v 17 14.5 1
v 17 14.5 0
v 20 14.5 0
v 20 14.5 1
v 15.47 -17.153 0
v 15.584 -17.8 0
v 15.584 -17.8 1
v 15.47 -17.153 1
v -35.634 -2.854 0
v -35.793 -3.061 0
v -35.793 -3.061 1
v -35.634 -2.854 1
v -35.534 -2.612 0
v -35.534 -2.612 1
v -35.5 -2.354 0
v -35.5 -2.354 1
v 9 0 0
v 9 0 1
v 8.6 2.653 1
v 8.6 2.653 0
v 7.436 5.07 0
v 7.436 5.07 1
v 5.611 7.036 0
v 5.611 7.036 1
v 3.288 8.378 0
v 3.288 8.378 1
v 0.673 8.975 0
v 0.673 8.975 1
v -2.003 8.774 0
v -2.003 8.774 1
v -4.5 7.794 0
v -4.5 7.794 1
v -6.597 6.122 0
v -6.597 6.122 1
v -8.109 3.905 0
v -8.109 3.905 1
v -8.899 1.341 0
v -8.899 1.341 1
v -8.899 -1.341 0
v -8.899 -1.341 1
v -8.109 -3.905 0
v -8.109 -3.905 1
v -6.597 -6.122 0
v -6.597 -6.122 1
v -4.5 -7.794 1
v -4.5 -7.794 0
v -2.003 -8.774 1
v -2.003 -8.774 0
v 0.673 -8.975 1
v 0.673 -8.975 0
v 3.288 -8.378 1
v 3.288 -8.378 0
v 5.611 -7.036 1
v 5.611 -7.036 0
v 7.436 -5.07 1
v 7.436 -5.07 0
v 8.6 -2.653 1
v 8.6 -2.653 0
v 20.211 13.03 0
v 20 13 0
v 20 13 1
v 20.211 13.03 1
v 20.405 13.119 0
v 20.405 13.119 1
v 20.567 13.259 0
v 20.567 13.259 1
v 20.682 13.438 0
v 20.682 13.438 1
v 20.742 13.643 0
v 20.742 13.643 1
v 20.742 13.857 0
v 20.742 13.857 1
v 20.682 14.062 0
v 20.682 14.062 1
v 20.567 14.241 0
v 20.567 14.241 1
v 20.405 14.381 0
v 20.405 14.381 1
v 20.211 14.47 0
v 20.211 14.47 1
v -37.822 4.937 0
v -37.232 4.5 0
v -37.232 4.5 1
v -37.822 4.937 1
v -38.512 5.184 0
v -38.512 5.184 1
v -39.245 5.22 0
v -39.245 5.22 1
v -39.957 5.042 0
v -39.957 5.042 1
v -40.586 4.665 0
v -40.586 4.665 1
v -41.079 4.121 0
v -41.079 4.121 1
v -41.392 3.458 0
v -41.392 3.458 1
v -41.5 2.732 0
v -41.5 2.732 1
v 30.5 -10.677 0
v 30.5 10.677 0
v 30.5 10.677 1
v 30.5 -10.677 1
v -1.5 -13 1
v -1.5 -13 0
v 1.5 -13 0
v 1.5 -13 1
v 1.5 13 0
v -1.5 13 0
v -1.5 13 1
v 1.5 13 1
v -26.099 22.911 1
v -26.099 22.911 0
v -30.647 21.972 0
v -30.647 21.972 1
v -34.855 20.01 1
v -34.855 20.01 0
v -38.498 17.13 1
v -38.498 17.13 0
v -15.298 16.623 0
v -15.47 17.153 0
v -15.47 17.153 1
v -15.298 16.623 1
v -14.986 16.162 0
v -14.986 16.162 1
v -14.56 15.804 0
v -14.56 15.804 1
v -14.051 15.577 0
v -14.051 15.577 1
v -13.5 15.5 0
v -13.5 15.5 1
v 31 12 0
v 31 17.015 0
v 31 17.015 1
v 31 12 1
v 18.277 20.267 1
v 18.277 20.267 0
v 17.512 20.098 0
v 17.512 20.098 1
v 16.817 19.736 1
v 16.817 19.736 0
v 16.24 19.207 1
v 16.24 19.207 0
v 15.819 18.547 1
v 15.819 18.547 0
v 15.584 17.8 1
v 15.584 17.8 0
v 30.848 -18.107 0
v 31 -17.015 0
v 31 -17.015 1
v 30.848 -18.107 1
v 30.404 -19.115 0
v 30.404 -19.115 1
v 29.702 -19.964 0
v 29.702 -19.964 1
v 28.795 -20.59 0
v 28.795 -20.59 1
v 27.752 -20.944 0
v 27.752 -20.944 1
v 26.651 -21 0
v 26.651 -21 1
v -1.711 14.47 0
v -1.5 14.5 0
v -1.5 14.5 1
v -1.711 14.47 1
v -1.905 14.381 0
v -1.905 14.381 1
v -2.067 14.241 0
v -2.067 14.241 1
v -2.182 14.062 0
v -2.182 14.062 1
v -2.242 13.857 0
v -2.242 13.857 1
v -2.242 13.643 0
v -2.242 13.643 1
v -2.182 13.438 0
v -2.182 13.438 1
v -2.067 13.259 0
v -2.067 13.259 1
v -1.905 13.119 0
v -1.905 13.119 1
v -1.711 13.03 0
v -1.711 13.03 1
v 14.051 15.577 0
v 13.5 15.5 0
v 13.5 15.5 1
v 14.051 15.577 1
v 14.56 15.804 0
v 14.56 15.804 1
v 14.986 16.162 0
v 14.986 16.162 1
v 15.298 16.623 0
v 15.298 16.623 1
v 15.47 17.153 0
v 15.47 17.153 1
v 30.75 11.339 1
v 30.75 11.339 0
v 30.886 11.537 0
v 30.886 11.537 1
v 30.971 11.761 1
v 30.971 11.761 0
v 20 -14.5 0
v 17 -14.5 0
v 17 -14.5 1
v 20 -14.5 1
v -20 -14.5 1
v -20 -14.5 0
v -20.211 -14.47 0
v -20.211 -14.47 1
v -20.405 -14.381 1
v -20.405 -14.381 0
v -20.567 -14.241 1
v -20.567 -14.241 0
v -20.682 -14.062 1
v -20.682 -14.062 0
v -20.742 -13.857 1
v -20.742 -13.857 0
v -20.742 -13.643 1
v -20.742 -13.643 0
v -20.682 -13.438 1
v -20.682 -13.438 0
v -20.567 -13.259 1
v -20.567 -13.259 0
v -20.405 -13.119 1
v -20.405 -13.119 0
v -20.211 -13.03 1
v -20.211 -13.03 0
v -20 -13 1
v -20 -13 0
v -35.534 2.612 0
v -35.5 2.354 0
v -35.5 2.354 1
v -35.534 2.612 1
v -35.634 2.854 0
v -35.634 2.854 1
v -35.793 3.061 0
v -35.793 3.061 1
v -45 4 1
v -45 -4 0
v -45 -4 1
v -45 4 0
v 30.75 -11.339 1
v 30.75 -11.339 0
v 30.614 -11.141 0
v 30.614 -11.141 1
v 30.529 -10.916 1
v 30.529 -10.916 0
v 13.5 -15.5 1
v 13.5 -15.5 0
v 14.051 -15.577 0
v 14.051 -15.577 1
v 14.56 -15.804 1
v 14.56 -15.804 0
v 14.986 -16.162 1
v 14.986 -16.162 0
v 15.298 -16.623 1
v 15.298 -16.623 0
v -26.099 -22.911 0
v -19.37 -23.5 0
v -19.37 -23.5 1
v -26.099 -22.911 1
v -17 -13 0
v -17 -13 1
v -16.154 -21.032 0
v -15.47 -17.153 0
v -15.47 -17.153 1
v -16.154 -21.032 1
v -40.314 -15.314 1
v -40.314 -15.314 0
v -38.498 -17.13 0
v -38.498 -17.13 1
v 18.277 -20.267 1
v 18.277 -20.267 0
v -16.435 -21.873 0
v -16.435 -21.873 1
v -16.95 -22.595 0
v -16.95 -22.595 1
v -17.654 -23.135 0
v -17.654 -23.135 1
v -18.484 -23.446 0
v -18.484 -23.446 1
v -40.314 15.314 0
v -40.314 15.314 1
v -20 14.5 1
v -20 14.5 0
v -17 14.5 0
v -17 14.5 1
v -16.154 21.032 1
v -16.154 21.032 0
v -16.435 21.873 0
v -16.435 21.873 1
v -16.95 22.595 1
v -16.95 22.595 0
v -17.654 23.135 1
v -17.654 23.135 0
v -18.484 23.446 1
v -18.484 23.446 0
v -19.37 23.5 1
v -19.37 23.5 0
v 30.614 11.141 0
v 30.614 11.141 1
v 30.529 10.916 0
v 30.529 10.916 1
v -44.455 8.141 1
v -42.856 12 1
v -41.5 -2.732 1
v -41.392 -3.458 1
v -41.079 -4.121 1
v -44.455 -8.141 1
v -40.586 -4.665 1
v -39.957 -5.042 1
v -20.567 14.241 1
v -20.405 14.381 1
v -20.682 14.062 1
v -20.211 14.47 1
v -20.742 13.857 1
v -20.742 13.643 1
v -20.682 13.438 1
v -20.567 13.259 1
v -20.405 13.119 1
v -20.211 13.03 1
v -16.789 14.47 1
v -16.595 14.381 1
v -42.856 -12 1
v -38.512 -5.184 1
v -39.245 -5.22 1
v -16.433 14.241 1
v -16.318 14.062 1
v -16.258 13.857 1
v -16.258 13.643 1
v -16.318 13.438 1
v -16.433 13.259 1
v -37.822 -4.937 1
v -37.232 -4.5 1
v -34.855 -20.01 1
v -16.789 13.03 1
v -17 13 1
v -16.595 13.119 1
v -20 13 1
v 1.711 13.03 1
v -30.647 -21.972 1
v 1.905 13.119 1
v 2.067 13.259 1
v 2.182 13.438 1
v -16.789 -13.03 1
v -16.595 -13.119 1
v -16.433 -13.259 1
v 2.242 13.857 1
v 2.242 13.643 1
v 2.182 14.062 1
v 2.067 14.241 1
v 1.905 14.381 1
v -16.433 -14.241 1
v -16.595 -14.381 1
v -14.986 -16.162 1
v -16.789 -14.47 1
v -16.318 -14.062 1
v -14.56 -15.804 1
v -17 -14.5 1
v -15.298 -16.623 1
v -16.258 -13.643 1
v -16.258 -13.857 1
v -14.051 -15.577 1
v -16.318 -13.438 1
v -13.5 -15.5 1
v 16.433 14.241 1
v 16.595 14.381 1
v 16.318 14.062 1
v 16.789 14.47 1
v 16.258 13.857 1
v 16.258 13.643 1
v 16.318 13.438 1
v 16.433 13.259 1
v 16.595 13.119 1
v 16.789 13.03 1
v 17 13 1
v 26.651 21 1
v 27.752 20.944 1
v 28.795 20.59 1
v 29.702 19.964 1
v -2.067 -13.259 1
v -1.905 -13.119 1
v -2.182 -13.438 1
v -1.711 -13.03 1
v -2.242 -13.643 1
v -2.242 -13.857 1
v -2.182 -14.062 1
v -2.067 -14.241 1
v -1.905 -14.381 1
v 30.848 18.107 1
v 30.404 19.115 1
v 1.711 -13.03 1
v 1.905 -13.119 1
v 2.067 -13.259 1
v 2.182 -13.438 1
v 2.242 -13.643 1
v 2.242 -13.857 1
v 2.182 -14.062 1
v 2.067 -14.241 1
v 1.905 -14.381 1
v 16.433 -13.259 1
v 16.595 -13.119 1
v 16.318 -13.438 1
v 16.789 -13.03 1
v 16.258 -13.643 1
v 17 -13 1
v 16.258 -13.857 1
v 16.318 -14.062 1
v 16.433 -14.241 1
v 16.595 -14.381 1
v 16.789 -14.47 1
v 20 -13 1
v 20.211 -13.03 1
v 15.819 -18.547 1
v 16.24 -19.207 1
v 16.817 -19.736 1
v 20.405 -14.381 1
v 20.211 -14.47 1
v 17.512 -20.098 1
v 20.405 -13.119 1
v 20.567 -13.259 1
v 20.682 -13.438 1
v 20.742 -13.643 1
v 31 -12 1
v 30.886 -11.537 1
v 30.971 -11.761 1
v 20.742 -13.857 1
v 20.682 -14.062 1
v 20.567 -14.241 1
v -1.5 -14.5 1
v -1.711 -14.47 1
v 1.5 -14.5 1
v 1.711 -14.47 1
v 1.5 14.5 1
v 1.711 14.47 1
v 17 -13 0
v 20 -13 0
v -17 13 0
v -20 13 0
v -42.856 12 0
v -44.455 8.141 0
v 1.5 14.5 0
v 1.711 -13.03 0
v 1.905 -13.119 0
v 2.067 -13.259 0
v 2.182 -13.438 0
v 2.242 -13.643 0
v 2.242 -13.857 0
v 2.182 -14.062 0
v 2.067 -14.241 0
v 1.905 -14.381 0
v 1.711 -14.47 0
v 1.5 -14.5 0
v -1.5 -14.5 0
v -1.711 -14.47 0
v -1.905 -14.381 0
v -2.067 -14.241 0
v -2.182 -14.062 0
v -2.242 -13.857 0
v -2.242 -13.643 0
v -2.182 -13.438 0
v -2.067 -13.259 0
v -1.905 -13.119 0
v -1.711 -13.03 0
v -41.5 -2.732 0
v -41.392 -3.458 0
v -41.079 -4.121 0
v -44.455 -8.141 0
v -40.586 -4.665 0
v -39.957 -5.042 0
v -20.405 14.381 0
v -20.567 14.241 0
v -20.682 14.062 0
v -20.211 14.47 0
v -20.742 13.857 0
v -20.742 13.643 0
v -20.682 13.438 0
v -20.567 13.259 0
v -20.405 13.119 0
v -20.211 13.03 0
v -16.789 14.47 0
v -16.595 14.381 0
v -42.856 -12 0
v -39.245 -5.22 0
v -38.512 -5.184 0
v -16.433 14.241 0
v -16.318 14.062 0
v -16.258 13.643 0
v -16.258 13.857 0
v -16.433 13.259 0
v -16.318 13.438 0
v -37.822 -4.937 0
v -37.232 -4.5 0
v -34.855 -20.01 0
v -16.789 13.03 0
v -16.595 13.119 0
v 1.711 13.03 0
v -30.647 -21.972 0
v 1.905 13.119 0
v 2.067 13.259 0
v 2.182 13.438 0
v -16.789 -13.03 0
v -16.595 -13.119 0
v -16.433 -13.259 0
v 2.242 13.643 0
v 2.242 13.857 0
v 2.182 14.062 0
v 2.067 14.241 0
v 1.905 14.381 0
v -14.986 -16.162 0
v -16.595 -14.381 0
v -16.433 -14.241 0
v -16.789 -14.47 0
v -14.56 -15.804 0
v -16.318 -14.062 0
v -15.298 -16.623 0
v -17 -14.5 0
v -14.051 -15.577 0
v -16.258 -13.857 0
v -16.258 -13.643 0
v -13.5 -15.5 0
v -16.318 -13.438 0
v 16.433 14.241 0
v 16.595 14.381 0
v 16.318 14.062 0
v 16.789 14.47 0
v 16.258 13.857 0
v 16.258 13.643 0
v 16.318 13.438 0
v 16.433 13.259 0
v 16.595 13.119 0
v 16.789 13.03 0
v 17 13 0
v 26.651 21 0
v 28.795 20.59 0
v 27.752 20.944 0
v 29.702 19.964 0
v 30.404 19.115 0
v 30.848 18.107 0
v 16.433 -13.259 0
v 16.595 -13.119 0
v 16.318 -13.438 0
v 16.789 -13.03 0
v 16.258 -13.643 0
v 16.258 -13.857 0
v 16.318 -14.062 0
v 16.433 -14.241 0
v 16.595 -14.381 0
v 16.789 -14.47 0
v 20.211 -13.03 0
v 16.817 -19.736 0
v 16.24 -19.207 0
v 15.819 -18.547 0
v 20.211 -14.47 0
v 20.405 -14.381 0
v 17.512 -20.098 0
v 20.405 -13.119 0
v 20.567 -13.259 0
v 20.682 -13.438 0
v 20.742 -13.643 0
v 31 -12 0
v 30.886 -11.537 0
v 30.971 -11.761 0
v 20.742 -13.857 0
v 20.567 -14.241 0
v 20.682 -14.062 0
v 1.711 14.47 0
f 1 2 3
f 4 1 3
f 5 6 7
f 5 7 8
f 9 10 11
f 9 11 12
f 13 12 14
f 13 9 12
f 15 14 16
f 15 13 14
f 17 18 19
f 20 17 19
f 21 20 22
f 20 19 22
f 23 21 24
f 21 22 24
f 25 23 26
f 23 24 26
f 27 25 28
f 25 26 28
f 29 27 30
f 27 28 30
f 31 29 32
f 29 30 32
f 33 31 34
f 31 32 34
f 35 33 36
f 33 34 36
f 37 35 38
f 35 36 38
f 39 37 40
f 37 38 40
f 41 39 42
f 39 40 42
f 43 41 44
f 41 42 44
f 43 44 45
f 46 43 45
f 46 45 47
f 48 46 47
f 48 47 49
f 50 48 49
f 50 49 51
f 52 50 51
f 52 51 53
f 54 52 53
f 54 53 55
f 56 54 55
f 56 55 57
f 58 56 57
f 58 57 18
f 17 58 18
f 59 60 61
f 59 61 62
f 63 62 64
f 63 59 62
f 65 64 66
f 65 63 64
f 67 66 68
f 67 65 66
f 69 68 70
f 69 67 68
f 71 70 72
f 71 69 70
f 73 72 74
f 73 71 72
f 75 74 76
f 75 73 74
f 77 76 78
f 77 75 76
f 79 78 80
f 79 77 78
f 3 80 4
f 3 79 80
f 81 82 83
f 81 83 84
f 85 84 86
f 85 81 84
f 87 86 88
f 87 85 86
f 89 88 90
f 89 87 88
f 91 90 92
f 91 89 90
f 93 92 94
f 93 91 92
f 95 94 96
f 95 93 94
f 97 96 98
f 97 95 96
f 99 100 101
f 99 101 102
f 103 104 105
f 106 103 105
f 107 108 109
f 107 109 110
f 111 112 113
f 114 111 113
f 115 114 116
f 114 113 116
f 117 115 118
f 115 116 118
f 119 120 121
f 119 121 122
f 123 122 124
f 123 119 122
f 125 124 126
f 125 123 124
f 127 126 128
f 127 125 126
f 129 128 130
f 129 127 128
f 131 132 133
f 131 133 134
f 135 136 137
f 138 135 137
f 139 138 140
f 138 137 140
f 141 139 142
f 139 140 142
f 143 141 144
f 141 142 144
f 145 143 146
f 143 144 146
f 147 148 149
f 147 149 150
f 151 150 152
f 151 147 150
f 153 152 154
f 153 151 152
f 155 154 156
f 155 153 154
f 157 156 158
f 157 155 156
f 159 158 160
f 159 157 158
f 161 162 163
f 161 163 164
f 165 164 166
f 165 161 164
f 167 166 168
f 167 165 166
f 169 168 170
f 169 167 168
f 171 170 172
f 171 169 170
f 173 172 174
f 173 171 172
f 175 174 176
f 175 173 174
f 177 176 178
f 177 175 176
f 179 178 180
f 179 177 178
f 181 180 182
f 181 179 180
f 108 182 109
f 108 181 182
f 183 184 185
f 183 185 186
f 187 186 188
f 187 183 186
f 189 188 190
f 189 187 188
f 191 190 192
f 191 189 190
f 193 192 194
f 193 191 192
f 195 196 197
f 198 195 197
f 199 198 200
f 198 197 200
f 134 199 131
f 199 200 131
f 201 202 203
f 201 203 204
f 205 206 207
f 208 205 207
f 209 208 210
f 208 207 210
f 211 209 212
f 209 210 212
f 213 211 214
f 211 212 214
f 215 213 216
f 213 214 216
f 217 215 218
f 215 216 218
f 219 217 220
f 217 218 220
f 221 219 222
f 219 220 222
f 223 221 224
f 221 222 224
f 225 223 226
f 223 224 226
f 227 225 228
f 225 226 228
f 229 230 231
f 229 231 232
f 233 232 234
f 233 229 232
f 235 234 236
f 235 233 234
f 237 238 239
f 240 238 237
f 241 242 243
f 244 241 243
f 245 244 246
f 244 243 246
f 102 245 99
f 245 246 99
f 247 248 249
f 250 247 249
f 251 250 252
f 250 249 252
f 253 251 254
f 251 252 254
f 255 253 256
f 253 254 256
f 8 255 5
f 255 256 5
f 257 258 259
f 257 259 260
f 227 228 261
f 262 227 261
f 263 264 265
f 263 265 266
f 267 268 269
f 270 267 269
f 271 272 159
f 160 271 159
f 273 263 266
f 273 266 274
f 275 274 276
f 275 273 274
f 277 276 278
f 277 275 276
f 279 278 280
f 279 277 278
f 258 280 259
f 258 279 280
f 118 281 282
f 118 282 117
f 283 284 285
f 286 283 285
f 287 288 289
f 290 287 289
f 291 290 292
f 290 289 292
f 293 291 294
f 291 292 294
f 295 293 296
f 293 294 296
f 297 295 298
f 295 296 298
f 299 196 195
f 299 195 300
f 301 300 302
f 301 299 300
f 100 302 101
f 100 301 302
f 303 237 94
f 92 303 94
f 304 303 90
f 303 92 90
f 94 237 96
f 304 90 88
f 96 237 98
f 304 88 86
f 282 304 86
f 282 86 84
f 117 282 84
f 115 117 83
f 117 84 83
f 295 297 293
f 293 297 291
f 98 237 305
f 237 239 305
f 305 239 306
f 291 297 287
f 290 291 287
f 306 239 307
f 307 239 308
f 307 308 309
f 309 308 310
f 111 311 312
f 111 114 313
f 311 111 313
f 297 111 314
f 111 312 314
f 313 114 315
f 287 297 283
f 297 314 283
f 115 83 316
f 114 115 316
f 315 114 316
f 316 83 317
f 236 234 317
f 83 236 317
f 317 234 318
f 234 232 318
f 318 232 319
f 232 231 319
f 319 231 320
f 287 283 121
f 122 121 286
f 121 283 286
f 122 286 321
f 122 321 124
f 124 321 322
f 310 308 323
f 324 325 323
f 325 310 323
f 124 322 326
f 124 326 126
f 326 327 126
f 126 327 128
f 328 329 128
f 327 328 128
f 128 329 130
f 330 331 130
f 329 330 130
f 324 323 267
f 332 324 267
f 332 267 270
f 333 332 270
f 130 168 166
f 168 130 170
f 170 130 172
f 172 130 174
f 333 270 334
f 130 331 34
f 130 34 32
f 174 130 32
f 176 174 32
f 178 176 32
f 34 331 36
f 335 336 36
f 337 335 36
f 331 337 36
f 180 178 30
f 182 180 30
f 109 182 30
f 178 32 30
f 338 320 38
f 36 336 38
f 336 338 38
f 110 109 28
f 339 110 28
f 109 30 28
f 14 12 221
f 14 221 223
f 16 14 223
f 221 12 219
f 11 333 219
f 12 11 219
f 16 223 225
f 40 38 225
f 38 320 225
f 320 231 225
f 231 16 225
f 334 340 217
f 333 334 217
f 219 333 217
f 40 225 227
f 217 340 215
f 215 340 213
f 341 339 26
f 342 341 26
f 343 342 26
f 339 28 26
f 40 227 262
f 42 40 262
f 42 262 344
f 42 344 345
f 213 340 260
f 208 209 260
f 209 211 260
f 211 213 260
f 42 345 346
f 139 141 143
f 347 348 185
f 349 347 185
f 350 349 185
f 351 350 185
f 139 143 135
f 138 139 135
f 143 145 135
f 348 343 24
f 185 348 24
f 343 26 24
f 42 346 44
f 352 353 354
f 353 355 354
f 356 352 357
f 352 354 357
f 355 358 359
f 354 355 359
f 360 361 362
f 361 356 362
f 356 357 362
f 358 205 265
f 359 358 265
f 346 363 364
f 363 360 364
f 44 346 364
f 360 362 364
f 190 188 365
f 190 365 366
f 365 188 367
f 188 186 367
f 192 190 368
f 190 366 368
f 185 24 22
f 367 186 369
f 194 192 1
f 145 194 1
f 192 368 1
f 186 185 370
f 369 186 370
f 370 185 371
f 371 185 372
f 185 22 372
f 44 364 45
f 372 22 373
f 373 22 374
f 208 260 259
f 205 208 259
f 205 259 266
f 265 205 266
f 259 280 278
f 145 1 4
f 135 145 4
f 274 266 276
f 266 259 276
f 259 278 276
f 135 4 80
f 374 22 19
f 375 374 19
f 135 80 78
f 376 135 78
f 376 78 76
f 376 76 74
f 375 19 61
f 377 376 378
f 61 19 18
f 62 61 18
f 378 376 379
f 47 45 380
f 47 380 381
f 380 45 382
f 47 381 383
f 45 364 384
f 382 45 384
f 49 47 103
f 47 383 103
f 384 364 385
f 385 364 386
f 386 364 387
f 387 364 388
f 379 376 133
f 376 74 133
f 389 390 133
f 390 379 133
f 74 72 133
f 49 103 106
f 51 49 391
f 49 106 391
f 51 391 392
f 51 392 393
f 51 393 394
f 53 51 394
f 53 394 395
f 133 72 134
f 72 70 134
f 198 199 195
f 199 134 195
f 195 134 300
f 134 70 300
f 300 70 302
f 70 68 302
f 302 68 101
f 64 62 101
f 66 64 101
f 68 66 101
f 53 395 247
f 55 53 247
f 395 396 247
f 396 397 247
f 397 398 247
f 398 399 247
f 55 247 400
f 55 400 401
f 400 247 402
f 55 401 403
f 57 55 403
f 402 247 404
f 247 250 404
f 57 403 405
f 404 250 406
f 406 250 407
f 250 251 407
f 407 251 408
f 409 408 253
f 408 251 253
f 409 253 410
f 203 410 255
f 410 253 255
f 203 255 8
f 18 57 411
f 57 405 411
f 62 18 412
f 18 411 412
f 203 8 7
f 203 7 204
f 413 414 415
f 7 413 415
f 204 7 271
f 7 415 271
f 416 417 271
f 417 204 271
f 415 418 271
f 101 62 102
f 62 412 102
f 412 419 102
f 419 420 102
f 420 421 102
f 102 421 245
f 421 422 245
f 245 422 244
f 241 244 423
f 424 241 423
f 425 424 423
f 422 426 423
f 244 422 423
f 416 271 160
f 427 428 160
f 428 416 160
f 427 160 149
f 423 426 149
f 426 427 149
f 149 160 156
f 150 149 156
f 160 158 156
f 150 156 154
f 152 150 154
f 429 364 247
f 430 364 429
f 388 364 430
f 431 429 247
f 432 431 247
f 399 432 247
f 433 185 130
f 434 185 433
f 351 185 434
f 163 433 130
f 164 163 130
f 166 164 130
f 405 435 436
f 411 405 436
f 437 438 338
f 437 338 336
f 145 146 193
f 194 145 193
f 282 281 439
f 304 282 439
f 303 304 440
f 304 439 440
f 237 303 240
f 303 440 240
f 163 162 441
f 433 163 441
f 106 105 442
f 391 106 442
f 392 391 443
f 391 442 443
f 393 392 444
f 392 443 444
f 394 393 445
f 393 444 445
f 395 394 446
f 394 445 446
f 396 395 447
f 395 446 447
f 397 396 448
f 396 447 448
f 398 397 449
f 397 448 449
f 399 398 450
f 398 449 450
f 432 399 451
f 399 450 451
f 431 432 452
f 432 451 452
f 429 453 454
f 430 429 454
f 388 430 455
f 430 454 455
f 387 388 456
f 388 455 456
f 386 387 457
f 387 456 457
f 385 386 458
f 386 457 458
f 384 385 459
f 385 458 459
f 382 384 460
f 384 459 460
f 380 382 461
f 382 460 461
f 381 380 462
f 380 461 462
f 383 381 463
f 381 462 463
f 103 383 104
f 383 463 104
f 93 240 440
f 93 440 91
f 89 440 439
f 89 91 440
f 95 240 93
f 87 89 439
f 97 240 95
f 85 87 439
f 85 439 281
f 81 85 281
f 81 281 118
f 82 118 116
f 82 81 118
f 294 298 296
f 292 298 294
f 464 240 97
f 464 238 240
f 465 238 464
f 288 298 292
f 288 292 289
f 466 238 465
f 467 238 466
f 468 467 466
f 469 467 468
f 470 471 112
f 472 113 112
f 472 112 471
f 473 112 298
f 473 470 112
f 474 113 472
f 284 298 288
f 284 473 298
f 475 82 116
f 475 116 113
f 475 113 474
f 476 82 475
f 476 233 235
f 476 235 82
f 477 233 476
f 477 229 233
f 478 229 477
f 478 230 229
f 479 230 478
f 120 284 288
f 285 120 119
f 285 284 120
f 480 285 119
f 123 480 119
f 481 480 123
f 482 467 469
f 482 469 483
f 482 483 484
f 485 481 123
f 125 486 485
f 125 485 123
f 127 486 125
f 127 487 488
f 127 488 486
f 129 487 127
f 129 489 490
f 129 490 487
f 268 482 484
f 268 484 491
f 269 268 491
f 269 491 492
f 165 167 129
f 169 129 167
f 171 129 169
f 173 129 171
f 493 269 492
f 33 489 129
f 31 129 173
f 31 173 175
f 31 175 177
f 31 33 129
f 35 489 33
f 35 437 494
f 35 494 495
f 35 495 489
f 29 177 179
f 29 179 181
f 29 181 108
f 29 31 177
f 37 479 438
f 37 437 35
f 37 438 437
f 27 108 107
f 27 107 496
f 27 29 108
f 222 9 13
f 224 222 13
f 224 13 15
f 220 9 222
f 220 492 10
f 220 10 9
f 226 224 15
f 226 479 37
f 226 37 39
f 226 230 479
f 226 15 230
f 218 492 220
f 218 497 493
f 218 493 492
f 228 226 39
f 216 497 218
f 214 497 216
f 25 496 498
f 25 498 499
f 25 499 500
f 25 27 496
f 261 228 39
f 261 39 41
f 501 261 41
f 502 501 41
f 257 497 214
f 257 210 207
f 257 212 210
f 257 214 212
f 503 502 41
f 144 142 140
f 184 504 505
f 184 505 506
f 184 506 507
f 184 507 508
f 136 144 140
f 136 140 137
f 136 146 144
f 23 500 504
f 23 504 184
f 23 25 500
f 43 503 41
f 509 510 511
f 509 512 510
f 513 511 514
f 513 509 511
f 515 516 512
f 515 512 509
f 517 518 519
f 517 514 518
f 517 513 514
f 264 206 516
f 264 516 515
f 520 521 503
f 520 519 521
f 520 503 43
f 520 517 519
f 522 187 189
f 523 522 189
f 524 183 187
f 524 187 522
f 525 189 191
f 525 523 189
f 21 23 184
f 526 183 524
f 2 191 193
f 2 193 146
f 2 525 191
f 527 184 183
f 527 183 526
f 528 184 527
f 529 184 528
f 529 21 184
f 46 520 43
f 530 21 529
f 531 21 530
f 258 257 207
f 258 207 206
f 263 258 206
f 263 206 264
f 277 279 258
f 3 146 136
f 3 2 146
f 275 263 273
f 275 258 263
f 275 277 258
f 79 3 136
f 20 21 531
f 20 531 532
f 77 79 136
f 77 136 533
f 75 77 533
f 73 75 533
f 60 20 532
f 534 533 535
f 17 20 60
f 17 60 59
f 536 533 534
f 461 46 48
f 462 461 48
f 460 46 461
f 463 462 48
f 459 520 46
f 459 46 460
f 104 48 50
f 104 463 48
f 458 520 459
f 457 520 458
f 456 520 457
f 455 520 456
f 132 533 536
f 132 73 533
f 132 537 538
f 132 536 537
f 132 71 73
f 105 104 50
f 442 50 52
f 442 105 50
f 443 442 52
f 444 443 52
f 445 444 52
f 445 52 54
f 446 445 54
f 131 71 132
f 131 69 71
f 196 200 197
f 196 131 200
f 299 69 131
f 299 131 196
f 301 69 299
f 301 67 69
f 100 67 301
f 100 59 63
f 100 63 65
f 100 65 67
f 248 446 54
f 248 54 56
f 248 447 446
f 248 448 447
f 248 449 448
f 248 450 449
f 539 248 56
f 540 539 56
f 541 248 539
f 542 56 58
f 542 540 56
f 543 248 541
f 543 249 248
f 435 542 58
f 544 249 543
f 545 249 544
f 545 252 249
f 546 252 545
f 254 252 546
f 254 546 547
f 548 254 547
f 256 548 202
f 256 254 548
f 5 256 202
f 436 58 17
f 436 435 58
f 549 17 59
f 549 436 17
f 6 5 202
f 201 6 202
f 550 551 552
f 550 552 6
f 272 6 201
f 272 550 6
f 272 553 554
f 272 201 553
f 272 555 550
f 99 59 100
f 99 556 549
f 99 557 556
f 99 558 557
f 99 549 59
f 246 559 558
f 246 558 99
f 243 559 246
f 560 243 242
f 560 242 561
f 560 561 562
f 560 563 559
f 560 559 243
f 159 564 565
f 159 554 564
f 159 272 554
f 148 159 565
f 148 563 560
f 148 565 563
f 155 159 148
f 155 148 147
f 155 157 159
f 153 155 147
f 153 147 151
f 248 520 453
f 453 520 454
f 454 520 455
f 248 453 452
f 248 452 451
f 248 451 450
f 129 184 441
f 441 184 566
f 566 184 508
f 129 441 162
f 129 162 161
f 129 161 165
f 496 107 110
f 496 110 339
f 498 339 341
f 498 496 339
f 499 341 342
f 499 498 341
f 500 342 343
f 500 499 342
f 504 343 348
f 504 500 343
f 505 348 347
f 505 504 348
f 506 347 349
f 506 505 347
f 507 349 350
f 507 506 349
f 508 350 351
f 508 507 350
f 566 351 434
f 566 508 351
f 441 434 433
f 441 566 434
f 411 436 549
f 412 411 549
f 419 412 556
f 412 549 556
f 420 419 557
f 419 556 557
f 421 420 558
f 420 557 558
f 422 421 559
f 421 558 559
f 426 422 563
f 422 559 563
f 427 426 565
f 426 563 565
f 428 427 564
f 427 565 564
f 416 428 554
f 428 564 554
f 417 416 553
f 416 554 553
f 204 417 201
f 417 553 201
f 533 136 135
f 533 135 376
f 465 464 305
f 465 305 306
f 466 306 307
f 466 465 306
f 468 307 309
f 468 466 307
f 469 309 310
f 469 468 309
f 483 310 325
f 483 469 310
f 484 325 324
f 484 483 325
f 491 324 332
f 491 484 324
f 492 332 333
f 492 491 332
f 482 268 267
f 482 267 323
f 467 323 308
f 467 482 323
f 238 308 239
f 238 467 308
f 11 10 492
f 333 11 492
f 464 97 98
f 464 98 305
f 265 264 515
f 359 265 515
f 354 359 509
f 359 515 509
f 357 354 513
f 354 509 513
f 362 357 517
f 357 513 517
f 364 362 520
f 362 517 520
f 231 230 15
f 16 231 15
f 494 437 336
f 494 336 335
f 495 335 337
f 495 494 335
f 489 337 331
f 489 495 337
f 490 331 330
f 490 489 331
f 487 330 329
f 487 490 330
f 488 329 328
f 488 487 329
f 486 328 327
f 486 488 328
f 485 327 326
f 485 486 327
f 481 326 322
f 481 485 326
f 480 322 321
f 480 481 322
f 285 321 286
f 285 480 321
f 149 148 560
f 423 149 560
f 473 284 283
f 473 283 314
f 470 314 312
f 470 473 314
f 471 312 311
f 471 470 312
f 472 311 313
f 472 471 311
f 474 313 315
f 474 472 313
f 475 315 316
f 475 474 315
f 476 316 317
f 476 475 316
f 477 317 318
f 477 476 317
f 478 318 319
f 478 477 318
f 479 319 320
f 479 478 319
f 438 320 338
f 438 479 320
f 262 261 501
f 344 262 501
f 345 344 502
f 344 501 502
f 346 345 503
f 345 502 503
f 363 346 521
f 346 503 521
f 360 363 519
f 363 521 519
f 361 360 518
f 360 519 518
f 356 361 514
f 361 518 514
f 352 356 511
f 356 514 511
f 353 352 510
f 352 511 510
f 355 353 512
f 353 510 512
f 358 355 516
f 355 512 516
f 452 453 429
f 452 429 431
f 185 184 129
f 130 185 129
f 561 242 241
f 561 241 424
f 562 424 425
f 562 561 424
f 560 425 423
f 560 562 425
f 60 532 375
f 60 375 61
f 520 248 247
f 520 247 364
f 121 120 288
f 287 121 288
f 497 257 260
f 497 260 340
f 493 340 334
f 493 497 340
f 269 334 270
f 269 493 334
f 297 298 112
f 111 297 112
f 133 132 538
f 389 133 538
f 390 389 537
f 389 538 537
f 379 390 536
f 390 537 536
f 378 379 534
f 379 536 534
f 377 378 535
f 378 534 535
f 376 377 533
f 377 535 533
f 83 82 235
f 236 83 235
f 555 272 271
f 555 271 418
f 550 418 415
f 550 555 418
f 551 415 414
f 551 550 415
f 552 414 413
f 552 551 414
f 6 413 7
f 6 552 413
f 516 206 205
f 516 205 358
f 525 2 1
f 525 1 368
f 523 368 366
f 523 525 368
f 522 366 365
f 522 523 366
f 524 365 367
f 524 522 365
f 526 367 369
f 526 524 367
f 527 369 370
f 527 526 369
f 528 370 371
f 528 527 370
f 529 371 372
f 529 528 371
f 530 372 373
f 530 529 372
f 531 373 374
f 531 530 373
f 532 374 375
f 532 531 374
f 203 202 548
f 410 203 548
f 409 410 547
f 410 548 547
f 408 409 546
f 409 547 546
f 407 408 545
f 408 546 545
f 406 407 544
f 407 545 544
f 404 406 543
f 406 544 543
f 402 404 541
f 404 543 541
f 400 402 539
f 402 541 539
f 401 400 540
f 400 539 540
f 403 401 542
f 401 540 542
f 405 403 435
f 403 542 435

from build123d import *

# Parameters (mm, degrees)
PAD_DEPTH       = 1
SKETCH_R        = 9
POCKET_DEPTH    = 1.001
POCKET001_DEPTH = 1.001


with BuildPart() as part:
    # Sketch007 → Pad (new body)
    with BuildSketch(Plane.XY):
        with BuildLine():
            Line((13.5, 15.5), (-13.5, 15.5))
            ThreePointArc((-15.469616, 17.152704), (-14.785575, 15.967911), (-13.5, 15.5))
            Line((-15.469616, 17.152704), (-16.153704, 21.03236))
            ThreePointArc((-16.153704, 21.03236), (-17.281843, 22.891476), (-19.369594, 23.5))
            Line((-19.369594, 23.5), (-26.098892, 22.911263))
            ThreePointArc((-26.098892, 22.911263), (-32.808142, 21.113525), (-38.497913, 17.129504))
            Line((-40.313708, 15.313708), (-38.497913, 17.129504))
            ThreePointArc((-40.313708, 15.313708), (-43.782073, 10.122935), (-45, 4))
            Line((-45, 4), (-45, 0))
            Line((-45, 0), (30.5, 0))
            Line((30.5, 0), (30.5, 10.677124))
            ThreePointArc((30.75, 11.338562), (30.564586, 11.030678), (30.5, 10.677124))
            ThreePointArc((30.75, 11.338562), (30.935414, 11.646447), (31, 12))
            Line((31, 17.015221), (31, 12))
            ThreePointArc((31, 17.015221), (29.702361, 19.964331), (26.651377, 21))
            Line((18.276649, 20.267306), (26.651377, 21))
            ThreePointArc((18.276649, 20.267306), (16.511345, 19.490554), (15.583693, 17.799667))
            Line((15.583693, 17.799667), (15.469616, 17.152704))
            ThreePointArc((13.5, 15.5), (14.785575, 15.967911), (15.469616, 17.152704))
        make_face()
        with BuildLine():
            Line((-20, 13), (-17, 13))
            ThreePointArc((-17, 13), (-16.25, 13.75), (-17, 14.5))
            Line((-20, 14.5), (-17, 14.5))
            ThreePointArc((-20, 14.5), (-20.75, 13.75), (-20, 13))
        make_face(mode=Mode.SUBTRACT)
        with BuildLine():
            Line((-1.5, 13), (1.5, 13))
            ThreePointArc((1.5, 13), (2.25, 13.75), (1.5, 14.5))
            Line((-1.5, 14.5), (1.5, 14.5))
            ThreePointArc((-1.5, 14.5), (-2.25, 13.75), (-1.5, 13))
        make_face(mode=Mode.SUBTRACT)
        with BuildLine():
            Line((17, 13), (20, 13))
            ThreePointArc((20, 13), (20.75, 13.75), (20, 14.5))
            Line((17, 14.5), (20, 14.5))
            ThreePointArc((17, 14.5), (16.25, 13.75), (17, 13))
        make_face(mode=Mode.SUBTRACT)
    pad = extrude(amount=PAD_DEPTH)

    # Mirrored: Pad across Sketch007 H_Axis
    add(pad.mirror(Plane.ZX))

    # Sketch (on Face5 of Mirrored) → Pocket (cut, through all)
    with BuildSketch(Plane.XY.offset(1)):
        Circle(SKETCH_R)
    extrude(amount=-POCKET_DEPTH, mode=Mode.SUBTRACT)

    # Sketch008 → Pocket001 (cut, through all)
    with BuildSketch(Plane.XY):
        with BuildLine():
            Line((-41.5, 2.732233), (-41.5, -2.732233))
            ThreePointArc((-41.5, -2.732233), (-39.956709, -5.041932), (-37.232233, -4.5))
            Line((-35.792893, -3.06066), (-37.232233, -4.5))
            ThreePointArc((-35.792893, -3.06066), (-35.57612, -2.736237), (-35.5, -2.353553))
            Line((-35.5, 2.353553), (-35.5, -2.353553))
            ThreePointArc((-35.5, 2.353553), (-35.57612, 2.736237), (-35.792893, 3.06066))
            Line((-37.232233, 4.5), (-35.792893, 3.06066))
            ThreePointArc((-37.232233, 4.5), (-39.956709, 5.041932), (-41.5, 2.732233))
        make_face()
    extrude(amount=POCKET001_DEPTH, mode=Mode.SUBTRACT)


solid = part.part
